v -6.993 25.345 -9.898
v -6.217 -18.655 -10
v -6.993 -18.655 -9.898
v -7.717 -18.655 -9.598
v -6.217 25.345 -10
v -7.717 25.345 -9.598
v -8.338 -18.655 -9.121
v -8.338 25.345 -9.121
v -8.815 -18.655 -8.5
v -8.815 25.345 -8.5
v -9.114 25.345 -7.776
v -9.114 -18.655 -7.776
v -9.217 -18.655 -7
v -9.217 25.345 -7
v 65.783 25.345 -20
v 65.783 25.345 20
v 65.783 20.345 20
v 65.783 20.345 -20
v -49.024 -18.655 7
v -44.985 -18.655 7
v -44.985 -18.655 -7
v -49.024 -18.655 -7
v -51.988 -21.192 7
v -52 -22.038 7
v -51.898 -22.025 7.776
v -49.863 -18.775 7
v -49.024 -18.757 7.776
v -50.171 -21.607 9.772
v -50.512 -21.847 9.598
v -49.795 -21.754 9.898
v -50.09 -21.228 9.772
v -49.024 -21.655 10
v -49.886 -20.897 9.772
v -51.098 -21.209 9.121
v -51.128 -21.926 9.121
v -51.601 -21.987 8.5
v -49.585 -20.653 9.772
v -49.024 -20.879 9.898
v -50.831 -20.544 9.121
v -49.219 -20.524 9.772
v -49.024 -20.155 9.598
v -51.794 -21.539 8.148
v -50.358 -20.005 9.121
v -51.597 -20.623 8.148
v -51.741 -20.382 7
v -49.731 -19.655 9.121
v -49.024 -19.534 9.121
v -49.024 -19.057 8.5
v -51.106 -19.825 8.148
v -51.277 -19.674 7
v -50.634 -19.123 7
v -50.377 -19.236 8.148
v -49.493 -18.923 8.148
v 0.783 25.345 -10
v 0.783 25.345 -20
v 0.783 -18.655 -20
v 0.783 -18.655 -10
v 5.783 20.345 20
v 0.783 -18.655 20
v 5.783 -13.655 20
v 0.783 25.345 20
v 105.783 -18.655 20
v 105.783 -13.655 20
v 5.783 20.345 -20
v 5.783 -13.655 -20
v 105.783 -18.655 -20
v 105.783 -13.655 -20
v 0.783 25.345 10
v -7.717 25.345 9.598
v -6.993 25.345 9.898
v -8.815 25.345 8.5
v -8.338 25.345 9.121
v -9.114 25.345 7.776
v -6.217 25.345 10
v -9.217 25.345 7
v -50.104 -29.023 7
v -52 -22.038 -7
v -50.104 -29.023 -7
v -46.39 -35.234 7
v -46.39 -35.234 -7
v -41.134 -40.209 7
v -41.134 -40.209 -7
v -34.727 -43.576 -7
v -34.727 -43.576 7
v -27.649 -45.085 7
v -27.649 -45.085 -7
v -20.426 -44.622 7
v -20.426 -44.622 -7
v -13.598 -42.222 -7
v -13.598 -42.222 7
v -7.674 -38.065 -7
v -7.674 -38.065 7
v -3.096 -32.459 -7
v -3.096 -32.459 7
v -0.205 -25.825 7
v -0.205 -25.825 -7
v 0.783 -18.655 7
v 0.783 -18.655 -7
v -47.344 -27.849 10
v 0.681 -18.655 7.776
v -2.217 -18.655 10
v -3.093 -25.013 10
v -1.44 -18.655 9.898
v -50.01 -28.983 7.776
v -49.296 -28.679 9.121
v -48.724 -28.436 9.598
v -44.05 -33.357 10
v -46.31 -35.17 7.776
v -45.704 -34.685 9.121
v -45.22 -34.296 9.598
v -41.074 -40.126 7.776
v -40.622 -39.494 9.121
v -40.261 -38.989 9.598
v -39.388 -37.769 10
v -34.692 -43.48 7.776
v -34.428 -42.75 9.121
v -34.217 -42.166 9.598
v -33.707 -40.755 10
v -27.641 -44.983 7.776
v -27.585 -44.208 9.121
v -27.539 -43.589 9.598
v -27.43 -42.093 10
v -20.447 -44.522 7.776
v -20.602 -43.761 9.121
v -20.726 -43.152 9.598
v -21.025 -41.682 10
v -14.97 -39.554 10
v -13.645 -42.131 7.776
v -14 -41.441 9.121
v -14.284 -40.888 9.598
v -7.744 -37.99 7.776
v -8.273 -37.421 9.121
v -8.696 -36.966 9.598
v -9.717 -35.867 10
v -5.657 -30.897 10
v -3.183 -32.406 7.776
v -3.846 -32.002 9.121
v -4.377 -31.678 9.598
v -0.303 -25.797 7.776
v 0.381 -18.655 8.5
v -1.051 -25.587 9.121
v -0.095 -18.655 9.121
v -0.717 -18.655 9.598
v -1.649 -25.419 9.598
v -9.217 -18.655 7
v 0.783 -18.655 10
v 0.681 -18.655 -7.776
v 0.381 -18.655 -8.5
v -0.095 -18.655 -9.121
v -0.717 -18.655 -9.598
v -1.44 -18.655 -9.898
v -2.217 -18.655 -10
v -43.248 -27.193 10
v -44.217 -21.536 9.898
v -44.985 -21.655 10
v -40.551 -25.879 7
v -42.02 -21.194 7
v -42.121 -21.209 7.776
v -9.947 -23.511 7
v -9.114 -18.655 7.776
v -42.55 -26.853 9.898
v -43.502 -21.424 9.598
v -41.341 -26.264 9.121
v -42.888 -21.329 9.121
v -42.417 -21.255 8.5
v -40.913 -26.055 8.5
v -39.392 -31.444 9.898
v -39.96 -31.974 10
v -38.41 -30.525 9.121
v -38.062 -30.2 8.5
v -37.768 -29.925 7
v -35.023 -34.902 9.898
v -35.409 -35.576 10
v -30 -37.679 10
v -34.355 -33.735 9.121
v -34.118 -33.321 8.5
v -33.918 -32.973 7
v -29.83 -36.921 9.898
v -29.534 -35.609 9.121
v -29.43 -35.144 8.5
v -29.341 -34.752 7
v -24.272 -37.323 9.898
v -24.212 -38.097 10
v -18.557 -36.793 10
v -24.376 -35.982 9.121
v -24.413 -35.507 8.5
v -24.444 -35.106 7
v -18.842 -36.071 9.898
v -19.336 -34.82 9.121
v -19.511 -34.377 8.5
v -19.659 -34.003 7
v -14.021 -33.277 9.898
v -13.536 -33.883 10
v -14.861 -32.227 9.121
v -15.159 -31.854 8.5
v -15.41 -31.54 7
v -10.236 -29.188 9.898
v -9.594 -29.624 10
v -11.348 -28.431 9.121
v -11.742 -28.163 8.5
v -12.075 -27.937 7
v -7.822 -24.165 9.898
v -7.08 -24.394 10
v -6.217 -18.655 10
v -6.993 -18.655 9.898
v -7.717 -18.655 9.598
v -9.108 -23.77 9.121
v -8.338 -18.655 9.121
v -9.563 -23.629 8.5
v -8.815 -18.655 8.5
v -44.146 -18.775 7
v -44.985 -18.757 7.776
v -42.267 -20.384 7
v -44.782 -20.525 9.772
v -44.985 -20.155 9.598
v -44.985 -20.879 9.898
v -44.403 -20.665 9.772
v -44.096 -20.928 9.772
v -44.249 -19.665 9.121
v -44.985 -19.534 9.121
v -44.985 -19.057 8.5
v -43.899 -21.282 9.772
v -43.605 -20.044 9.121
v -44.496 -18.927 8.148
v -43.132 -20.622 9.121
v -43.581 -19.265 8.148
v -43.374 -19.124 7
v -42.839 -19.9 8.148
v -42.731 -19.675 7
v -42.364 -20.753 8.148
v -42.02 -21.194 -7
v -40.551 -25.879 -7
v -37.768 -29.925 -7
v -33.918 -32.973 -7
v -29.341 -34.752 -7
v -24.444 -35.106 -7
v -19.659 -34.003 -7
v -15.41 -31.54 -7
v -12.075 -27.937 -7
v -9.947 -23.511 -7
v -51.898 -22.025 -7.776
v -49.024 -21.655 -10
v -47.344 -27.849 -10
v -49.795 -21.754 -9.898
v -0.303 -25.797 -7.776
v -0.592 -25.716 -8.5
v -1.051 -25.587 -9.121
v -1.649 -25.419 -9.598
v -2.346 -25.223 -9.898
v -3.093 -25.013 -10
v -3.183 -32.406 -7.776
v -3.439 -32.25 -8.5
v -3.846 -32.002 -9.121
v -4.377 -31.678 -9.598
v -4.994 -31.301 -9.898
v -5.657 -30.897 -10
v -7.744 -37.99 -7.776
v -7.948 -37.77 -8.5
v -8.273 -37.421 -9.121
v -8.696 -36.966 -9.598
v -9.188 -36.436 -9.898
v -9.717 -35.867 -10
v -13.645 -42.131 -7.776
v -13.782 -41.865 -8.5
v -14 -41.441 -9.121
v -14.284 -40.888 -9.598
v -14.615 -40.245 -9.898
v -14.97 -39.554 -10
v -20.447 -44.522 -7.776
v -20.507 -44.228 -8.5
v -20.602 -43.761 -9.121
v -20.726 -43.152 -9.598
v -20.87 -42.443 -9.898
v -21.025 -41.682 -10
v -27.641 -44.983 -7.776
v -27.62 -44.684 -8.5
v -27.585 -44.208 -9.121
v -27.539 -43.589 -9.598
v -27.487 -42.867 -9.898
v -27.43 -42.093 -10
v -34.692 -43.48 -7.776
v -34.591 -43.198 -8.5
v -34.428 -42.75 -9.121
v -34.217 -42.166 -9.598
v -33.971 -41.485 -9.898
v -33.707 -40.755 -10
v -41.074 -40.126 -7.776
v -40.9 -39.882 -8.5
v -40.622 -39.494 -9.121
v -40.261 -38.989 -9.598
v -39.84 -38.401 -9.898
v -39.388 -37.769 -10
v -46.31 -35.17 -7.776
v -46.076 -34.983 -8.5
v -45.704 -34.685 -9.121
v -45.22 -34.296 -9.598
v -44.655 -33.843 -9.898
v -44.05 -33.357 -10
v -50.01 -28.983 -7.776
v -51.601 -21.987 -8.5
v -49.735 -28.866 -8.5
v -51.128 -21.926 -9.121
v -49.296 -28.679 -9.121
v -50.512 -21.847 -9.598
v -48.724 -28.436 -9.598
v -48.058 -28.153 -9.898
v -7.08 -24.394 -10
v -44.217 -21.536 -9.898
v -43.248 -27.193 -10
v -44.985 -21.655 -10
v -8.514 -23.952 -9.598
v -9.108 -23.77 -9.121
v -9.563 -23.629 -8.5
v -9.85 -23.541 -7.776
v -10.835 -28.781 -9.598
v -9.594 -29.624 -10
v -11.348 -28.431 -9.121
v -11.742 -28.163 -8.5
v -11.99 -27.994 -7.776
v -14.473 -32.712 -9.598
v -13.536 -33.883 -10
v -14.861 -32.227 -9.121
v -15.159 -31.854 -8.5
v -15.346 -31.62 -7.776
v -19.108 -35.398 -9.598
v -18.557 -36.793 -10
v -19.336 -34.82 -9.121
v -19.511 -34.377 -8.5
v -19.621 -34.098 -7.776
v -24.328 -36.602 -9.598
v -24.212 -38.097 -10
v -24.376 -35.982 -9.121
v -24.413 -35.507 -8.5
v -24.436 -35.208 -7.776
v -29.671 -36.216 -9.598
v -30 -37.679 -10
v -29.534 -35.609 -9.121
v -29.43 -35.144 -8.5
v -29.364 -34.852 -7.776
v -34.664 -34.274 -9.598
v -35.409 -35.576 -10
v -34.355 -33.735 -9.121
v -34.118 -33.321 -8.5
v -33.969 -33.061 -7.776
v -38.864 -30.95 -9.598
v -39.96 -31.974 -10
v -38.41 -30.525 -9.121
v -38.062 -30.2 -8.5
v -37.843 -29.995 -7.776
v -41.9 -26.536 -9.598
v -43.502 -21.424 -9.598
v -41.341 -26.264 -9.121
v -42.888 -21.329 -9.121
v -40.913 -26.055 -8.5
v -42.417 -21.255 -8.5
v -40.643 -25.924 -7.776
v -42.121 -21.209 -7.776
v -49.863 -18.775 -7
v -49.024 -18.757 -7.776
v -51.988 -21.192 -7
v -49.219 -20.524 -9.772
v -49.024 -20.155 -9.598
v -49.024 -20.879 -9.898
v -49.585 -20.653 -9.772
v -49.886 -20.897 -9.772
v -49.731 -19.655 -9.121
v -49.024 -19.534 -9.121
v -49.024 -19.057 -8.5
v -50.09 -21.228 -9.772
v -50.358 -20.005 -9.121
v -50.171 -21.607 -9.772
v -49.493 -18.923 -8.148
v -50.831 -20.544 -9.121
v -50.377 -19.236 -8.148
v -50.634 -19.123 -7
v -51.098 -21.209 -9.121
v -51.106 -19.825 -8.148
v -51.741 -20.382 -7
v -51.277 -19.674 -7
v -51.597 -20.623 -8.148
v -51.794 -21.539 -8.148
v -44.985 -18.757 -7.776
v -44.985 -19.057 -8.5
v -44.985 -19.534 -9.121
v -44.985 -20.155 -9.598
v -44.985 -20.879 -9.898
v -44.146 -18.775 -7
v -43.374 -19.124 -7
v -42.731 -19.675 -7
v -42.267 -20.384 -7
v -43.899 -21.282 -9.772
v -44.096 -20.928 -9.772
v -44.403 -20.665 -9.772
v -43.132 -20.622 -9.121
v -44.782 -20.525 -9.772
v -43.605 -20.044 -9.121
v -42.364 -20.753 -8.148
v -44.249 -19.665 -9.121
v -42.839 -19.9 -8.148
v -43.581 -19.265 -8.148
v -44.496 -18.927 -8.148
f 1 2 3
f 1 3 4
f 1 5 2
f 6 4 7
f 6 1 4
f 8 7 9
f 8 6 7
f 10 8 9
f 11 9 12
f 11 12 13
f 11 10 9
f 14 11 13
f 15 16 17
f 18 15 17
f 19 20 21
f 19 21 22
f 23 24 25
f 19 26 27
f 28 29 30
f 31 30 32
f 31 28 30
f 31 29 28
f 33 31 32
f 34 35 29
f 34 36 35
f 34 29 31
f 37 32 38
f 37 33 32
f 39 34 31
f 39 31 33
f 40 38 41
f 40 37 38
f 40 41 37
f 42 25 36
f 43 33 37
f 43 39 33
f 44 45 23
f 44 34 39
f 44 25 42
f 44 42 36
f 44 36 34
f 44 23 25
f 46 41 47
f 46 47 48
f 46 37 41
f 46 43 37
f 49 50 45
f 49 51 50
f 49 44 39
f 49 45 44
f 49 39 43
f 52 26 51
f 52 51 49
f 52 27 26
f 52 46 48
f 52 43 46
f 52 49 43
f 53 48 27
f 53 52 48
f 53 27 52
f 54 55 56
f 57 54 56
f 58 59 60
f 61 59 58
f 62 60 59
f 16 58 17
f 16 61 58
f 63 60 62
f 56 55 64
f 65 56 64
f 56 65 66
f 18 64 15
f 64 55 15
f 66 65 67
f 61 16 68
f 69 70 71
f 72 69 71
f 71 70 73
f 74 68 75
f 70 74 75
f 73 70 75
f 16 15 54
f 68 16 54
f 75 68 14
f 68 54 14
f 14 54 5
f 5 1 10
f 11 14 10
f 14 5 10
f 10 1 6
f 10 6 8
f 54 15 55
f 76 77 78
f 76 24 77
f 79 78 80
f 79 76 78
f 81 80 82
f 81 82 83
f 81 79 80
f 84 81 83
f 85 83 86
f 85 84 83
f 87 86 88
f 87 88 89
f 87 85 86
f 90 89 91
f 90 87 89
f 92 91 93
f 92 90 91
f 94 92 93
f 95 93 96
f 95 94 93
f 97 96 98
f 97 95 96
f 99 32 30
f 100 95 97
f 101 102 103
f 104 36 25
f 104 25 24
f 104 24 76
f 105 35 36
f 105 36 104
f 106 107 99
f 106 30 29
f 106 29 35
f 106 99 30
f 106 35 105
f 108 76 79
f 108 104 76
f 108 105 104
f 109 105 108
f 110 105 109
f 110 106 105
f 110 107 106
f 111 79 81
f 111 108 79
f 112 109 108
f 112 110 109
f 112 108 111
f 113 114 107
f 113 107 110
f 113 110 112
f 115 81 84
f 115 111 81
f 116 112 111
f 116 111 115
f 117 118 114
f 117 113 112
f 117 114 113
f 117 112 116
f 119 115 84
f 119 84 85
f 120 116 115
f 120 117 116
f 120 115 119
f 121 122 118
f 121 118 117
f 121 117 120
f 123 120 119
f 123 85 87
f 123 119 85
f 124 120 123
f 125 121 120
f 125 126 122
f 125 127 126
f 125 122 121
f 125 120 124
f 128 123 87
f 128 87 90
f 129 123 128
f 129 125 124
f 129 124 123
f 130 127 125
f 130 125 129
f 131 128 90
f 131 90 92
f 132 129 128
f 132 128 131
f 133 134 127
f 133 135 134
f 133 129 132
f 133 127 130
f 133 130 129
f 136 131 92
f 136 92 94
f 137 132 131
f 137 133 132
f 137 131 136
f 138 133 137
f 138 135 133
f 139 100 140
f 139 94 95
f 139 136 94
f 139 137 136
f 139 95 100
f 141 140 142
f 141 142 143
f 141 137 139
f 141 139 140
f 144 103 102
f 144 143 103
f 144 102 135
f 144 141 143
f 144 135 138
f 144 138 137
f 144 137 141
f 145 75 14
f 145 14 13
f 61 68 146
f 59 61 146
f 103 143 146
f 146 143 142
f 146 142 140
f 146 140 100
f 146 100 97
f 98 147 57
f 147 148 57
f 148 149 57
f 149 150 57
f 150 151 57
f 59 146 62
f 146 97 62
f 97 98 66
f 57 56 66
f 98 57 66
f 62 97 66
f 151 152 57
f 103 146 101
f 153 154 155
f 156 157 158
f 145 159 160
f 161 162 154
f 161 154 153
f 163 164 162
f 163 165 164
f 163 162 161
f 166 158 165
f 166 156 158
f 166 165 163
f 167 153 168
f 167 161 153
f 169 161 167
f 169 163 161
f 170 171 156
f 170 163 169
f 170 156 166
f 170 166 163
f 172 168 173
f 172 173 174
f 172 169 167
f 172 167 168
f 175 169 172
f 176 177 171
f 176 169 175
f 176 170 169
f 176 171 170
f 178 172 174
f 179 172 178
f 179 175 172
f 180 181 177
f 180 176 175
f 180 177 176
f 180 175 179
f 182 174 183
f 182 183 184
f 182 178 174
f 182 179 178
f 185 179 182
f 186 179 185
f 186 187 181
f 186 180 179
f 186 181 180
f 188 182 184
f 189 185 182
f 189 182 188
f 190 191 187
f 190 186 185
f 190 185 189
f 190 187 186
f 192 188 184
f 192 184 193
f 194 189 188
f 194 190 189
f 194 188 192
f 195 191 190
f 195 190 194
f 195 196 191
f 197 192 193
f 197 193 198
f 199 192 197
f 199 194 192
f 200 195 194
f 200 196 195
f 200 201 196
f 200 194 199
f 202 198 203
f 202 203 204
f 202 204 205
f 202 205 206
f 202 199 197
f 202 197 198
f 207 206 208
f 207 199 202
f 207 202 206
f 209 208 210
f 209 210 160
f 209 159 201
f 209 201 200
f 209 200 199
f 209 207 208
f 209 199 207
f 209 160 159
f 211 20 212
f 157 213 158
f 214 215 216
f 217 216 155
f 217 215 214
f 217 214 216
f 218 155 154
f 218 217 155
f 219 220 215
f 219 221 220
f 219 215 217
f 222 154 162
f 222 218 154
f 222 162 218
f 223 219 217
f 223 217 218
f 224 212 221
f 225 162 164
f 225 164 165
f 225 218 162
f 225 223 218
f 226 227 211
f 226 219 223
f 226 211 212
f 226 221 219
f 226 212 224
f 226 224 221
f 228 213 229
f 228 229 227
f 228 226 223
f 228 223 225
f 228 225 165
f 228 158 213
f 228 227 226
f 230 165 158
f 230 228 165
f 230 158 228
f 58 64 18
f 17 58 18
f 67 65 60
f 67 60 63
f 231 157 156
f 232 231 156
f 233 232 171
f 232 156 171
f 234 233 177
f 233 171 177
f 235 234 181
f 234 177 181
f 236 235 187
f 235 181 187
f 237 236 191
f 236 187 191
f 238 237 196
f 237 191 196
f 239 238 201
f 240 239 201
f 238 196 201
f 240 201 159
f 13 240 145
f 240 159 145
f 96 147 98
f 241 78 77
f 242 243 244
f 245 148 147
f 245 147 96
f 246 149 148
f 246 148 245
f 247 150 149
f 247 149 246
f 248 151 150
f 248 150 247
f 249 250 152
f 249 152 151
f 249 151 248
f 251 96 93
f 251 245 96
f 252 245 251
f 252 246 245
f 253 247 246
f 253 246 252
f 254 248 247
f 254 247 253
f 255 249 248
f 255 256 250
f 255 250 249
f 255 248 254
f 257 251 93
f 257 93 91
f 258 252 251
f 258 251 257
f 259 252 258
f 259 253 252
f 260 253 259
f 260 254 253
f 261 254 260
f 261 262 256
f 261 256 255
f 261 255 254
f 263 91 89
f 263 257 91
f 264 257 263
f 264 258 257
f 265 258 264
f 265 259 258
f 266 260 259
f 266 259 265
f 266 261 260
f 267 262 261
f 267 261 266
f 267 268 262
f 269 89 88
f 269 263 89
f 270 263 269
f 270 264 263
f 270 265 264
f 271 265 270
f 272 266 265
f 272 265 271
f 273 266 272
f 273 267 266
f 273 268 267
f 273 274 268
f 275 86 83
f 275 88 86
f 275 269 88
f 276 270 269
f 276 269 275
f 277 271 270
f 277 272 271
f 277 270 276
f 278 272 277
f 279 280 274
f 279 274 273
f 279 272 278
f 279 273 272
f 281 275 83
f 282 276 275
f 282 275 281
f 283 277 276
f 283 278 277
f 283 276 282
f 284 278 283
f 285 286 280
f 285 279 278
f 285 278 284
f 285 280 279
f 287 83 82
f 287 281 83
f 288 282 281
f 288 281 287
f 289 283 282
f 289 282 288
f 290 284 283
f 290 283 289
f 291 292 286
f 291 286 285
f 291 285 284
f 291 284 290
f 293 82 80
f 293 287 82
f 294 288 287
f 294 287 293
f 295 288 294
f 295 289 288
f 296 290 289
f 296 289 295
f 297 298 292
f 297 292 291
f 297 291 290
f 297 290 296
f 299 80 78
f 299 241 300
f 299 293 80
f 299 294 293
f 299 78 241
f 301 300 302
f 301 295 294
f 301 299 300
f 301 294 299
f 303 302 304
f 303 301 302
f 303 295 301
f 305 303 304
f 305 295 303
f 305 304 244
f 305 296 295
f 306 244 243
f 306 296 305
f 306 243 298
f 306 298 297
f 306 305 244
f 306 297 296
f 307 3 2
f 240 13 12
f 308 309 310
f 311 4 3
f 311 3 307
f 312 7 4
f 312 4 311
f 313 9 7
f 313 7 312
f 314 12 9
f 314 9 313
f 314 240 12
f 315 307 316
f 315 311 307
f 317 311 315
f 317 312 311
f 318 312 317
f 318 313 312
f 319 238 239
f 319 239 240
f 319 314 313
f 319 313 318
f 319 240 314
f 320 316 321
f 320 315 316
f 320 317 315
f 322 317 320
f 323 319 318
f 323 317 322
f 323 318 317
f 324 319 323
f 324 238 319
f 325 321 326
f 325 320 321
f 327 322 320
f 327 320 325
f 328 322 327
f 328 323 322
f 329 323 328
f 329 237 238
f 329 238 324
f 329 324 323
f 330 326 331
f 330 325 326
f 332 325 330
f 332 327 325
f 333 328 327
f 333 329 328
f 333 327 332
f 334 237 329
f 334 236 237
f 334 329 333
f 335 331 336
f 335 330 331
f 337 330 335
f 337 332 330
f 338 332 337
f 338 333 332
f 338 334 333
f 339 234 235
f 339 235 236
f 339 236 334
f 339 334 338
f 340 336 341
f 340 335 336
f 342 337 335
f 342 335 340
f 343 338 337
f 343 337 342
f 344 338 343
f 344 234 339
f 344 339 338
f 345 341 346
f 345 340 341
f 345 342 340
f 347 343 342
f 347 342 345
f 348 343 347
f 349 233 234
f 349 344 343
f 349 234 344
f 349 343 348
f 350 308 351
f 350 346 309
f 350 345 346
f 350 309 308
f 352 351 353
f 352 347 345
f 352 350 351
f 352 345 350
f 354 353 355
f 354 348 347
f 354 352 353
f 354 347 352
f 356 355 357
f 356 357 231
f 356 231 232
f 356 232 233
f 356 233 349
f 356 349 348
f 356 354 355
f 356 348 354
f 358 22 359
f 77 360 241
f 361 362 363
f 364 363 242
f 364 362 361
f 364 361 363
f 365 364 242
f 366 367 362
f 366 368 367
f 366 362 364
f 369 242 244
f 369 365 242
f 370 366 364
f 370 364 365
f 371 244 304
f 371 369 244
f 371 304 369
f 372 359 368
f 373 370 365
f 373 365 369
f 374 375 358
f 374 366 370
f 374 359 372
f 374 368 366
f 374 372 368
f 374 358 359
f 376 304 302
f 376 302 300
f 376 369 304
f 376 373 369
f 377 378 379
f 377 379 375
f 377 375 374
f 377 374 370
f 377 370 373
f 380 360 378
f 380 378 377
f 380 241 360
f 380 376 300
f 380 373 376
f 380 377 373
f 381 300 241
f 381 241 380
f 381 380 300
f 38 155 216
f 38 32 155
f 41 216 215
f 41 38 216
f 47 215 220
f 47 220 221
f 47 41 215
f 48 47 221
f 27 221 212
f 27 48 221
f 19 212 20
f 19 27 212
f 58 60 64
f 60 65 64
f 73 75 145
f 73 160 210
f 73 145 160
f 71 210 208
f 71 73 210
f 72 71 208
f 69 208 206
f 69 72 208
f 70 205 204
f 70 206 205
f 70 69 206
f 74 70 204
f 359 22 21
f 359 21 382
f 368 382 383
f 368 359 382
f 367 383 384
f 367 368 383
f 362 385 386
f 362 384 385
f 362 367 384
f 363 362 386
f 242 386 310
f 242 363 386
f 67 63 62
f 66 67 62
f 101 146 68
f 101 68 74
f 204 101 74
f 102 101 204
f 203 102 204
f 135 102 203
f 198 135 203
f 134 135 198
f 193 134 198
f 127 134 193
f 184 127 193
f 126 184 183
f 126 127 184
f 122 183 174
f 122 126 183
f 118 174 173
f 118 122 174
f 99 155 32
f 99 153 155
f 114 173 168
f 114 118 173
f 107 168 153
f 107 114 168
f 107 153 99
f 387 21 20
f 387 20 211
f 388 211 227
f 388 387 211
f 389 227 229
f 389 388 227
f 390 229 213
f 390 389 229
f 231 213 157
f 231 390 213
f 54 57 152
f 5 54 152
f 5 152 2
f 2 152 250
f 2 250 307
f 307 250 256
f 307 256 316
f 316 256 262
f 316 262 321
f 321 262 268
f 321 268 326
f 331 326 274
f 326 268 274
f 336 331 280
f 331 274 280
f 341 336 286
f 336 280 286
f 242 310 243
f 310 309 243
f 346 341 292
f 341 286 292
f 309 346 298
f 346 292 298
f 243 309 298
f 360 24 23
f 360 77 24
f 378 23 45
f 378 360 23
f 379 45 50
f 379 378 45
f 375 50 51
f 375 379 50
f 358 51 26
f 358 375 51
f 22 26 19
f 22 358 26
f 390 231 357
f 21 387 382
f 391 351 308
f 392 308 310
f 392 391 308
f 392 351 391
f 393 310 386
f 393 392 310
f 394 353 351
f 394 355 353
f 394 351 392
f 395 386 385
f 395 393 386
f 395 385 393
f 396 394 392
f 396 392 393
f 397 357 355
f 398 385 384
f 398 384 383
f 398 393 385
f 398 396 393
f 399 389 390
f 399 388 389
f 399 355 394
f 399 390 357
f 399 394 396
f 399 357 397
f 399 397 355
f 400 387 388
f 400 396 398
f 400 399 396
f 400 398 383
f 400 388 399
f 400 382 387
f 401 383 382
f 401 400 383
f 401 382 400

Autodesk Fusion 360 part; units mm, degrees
sketch "Sketch1" plane through (0, 0, 0) normal (0, 0, 1) x (1, 0, 0)
  line L0 (5.7833, 3.3448) -> (5.7833, 20.3448)
  line L1 (5.7833, 20.3448) -> (35.7833, 20.3448)
  line L2 (5.7833, 3.3448) -> (55.7833, 3.3448)
  line L3 (35.7833, 20.3448) -> (5.7833, 20.3448)
  line L4 (5.7833, 20.3448) -> (5.7833, 22.8448)
  line L5 (5.7833, 22.8448) -> (35.7833, 22.8448)
  line L6 (35.7833, 22.8448) -> (35.7833, 20.3448)
  line L7 (5.7833, 3.3448) -> (55.7833, 3.3448)
  line L8 (55.7833, 3.3448) -> (55.7833, 0.8448)
  line L9 (55.7833, 0.8448) -> (5.7833, 0.8448)
  line L10 (5.7833, 0.8448) -> (5.7833, 3.3448)
  line L11 (5.7833, 22.8448) -> (3.2833, 22.8448)
  line L12 (3.2833, 22.8448) -> (3.2833, 0.8448)
  line L13 (3.2833, 0.8448) -> (5.7833, 0.8448)
  line L14 (5.7833, 0.8448) -> (5.7833, 22.8448)
  dimension "d1" = 17
  dimension "d2" = 30
  dimension "d3" = 50
  dimension "d4" = 2.5
  dimension "d5" = 2.5
  dimension "d6" = 2.5
extrude "Extrude1" add sketch "Sketch1" along normal blind 20
sketch "Sketch2" plane through (0, 0, 20) normal (0, 0, 1) x (-1, 0, 0)
  line L0 (-35.7833, -22.8448) -> (-3.2833, -22.8448)
  line L1 (-3.2833, -22.8448) -> (-3.2833, -0.8448)
  line L2 (-3.2833, -0.8448) -> (-55.7833, -0.8448)
  line L3 (-55.7833, -0.8448) -> (-55.7833, -3.3448)
  line L4 (-55.7833, -3.3448) -> (-5.7833, -3.3448)
  line L5 (-5.7833, -3.3448) -> (-5.7833, -20.3448)
  line L6 (-5.7833, -20.3448) -> (-35.7833, -20.3448)
  line L7 (-35.7833, -20.3448) -> (-35.7833, -22.8448)
sketch "Sketch3" plane through (3.2833, 0, 0) normal (-1, 0, 0) x (0, -1, 0)
  line L0 (-22.8448, 0) -> (-0.8448, 0)
  line L1 (-0.8448, 0) -> (-0.8448, 20)
  line L2 (-0.8448, 20) -> (-22.8448, 20)
  line L3 (-22.8448, 20) -> (-22.8448, 0)
  line L4 (-22.8448, 5) -> (-0.8448, 5)
  line L5 (-0.8448, 5) -> (-0.8448, 15)
  line L6 (-0.8448, 15) -> (-22.8448, 15)
  line L7 (-22.8448, 15) -> (-22.8448, 5)
  dimension "d10" = 10
extrude "Extrude2" add sketch "Sketch3" along normal blind 5 contours L1 L3 L4 L5 L6 L7
sketch "Sketch4" plane through (0, 0, 15) normal (0, 0, 1) x (-1, 0, 0)
  line L0 (-3.2833, -0.8448) -> (-3.2833, -22.8448)
  line L1 (-3.2833, -22.8448) -> (1.7167, -22.8448)
  line L2 (1.7167, -22.8448) -> (1.7167, -0.8448)
  line L3 (1.7167, -0.8448) -> (-3.2833, -0.8448)
  arc A0 (18.2167, -0.8448) -> (1.7167, -0.8448) centre (9.9667, -0.8448) ccw
  line L4 (18.2167, -0.8448) -> (23.2167, -0.8448)
  arc A1 (23.2167, -0.8448) -> (-3.2833, -0.8448) centre (9.9667, -0.8448) ccw
  dimension "d13" = 16.5
  dimension "d14" = 5
extrude "Extrude3" add sketch "Sketch4" against normal blind 10 contours L3 A0 L4 A1
fillet "Fillet1" radius 1.5 10 edges at (-20.7167, 0.8448, 15) (-20.7167, 0.8448, 5) (-18.2167, 0.8448, 10) (-23.2167, 0.8448, 10) (-9.9667, -12.4052, 5) (-9.9667, -12.4052, 15) (-9.9667, -7.4052, 5) (-1.7167, 11.8448, 5) (-9.9667, -7.4052, 15) (-1.7167, 11.8448, 15)
scale "Scale1" factor 2 about (5.7833, 20.3448, 20) bodies 1
